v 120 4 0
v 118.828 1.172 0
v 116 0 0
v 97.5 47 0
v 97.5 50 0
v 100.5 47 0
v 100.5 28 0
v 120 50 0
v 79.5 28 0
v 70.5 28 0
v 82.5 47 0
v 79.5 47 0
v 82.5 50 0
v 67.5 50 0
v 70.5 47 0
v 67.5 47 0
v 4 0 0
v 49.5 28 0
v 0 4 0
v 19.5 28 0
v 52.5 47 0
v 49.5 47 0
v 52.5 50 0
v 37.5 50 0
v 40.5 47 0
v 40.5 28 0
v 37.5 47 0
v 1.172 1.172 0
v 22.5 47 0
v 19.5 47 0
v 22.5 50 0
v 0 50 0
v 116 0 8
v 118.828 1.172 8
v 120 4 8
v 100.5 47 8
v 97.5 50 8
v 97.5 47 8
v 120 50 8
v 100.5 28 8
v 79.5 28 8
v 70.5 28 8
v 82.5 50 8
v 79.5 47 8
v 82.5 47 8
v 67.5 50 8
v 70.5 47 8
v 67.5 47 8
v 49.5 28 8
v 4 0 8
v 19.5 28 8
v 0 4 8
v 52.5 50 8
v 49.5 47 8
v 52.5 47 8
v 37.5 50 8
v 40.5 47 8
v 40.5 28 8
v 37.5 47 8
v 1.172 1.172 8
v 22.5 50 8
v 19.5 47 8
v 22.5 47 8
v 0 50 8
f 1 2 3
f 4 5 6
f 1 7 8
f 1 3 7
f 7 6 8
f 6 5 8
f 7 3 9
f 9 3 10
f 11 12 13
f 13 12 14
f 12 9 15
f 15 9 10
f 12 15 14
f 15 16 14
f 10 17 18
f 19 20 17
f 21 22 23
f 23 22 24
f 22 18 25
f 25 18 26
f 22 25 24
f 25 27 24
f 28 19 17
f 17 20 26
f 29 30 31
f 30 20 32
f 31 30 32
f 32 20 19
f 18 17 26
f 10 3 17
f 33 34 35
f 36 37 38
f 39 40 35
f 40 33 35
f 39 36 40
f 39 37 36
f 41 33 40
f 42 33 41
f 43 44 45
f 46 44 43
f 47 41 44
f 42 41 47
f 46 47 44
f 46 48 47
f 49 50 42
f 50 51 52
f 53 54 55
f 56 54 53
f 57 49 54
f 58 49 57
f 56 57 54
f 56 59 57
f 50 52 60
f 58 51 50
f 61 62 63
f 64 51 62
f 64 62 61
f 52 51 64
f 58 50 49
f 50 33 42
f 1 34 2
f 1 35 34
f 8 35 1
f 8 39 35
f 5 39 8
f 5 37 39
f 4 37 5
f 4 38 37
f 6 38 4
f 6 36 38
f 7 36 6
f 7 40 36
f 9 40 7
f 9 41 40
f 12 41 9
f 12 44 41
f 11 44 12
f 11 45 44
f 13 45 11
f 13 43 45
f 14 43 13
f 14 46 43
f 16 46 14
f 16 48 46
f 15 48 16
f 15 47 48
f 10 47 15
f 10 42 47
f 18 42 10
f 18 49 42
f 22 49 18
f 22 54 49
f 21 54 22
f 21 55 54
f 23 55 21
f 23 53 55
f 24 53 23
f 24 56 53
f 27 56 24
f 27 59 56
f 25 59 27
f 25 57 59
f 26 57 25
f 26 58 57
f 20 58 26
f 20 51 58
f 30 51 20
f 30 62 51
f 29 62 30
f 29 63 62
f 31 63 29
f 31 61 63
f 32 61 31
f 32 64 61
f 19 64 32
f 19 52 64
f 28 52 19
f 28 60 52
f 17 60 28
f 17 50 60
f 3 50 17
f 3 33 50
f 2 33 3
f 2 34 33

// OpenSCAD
$fn = 32;

// ----------------------------------------------------------------------
// Oversize slot bar: 120 mm bar with 3 oversize windows
// ----------------------------------------------------------------------

// --- parameters (mm) ---
profile_height = 8;       // extrusion height
profile_points = 32;      // points of the closed outline

profile = [[0, 4], [1.172, 1.172], [4, 0], [116, 0], [118.828, 1.172], [120, 4], [120, 50], [97.5, 50], [97.5, 47], [100.5, 47], [100.5, 28], [79.5, 28], [79.5, 47], [82.5, 47], [82.5, 50], [67.5, 50], [67.5, 47], [70.5, 47], [70.5, 28], [49.5, 28], [49.5, 47], [52.5, 47], [52.5, 50], [37.5, 50], [37.5, 47], [40.5, 47], [40.5, 28], [19.5, 28], [19.5, 47], [22.5, 47], [22.5, 50], [0, 50]];  // single closed polygon, 32 points, counter clockwise

// --- the one profile operation ---
linear_extrude(height = profile_height) polygon(points = profile);
